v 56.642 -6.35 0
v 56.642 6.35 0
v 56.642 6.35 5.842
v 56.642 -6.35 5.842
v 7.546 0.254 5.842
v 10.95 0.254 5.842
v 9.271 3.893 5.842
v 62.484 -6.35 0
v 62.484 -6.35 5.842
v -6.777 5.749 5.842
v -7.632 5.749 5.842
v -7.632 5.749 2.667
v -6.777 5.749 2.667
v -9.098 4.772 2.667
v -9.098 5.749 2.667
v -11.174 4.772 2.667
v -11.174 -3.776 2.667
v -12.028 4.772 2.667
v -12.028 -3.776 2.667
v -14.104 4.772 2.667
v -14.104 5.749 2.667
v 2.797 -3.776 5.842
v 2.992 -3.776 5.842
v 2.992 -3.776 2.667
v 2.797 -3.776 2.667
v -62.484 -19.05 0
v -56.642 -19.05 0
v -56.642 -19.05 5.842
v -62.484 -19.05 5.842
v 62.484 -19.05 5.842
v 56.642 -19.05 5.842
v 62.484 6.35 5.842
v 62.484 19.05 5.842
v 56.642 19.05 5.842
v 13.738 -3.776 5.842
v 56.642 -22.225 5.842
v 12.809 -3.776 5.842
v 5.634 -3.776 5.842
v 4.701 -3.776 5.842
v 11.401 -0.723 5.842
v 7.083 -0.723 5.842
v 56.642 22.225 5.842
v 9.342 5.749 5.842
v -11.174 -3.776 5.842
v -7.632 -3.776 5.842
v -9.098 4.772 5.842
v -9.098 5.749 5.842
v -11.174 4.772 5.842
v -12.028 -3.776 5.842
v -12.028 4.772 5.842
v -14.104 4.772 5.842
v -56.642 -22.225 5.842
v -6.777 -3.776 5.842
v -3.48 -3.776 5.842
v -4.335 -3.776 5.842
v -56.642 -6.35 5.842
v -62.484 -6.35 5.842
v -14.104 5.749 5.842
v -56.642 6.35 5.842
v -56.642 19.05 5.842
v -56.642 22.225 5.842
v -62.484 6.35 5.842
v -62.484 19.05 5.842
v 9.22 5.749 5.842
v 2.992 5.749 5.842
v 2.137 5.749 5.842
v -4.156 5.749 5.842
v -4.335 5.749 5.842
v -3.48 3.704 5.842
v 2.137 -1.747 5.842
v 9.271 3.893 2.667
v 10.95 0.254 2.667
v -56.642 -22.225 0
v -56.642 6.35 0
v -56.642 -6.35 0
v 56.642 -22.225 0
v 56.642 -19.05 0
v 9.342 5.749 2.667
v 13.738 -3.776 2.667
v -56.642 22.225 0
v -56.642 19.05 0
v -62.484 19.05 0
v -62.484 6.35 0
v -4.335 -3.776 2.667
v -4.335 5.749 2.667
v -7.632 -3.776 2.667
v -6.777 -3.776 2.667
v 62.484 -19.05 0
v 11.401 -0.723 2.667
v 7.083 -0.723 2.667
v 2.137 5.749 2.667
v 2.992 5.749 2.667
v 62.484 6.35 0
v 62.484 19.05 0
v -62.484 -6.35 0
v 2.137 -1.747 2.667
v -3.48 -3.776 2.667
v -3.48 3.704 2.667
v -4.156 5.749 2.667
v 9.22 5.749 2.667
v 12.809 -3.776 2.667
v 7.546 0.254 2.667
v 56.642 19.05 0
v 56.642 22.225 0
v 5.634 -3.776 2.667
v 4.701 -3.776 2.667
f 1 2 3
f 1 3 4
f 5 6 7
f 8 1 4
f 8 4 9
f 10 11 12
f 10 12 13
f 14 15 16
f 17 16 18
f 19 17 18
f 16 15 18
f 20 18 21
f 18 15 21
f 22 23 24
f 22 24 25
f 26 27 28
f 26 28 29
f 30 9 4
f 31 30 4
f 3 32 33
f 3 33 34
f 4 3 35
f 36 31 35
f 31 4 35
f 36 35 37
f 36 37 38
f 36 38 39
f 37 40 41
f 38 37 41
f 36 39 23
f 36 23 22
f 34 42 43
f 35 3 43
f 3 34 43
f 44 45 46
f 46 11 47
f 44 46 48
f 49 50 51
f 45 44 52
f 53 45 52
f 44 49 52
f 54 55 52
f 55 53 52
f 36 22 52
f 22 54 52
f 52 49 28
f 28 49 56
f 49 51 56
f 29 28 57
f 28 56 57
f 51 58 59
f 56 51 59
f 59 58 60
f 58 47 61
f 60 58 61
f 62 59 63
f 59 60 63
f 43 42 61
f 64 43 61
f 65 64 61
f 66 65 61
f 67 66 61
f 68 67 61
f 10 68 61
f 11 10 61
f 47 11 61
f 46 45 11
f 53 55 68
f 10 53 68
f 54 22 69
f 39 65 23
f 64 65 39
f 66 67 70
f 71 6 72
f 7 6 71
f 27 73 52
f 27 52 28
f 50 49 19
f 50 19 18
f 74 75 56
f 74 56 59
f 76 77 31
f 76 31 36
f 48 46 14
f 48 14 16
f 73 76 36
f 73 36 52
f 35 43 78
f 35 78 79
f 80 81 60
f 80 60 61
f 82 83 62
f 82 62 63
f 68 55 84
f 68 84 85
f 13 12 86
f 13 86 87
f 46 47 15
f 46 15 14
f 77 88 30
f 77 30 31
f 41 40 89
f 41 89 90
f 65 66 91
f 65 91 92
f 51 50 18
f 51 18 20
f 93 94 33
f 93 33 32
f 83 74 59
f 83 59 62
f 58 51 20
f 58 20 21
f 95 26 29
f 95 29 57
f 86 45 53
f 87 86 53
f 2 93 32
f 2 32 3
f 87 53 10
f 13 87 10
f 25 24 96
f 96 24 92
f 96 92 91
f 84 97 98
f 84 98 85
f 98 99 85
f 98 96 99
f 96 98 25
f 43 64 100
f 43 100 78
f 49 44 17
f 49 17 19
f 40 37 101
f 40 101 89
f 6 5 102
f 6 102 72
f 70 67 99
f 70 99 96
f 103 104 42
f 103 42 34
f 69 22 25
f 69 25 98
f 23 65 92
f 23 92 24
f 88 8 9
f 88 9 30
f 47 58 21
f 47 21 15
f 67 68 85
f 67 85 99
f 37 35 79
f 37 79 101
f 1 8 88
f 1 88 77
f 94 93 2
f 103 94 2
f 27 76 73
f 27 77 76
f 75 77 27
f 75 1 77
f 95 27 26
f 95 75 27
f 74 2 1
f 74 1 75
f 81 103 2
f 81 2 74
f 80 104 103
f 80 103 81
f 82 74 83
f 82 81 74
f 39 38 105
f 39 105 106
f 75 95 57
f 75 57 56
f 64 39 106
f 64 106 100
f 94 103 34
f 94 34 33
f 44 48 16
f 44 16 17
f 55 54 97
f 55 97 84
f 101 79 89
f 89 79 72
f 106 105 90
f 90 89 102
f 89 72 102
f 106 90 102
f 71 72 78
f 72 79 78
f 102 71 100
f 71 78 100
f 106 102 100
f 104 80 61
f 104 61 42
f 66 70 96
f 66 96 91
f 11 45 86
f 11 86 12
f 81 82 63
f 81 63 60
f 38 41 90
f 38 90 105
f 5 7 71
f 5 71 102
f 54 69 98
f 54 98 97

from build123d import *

# Parameters (mm, degrees)
BOSS_EXTRUDE1_DEPTH = 5.842
SKETCH2_W           = 0.854807692
SKETCH2_H           = 9.525
CUT_EXTRUDE1_DEPTH  = 3.175


with BuildPart() as part:
    # Sketch1 → Boss-Extrude1 (new body)
    with BuildSketch(Plane.XY):
        Polygon((56.642, -22.225), (-56.642, -22.225), (-56.642, -19.05), (-62.484, -19.05), (-62.484, -6.35), (-56.642, -6.35), (-56.642, 6.35), (-62.484, 6.35), (-62.484, 19.05), (-56.642, 19.05), (-56.642, 22.225), (56.642, 22.225), (56.642, 19.05), (62.484, 19.05), (62.484, 6.35), (56.642, 6.35), (56.642, -6.35), (62.484, -6.35), (62.484, -19.05), (56.642, -19.05), align=None)
    extrude(amount=BOSS_EXTRUDE1_DEPTH)

    # Sketch2 → Cut-Extrude1 (cut)
    with BuildSketch(Plane.XY.offset(5.842)):
        Polygon((-14.104326923, 4.772358215), (-14.104326923, 5.749281292), (-9.097596154, 5.749281292), (-9.097596154, 4.772358215), (-11.173557692, 4.772358215), (-11.173557692, -3.775718708), (-12.028365385, -3.775718708), (-12.028365385, 4.772358215), align=None)
        with Locations((-7.204807692, 0.986781292)):
            Rectangle(SKETCH2_W, SKETCH2_H)
        Polygon((-4.335096154, -3.775718708), (-4.335096154, 5.749281292), (-4.155739183, 5.749281292), (2.137019231, -1.747458491), (2.137019231, 5.749281292), (2.991826923, 5.749281292), (2.991826923, -3.775718708), (2.797205529, -3.775718708), (-3.480288462, 3.7038486), (-3.480288462, -3.775718708), align=None)
        Polygon((9.341826923, 5.749281292), (13.737980769, -3.775718708), (12.808759014, -3.775718708), (11.400615986, -0.722834092), (7.082692308, -0.722834092), (5.634480168, -3.775718708), (4.701442308, -3.775718708), (9.219711538, 5.749281292), align=None)
        Polygon((9.271228966, 3.892745835), (7.546349159, 0.254088984), (10.950315505, 0.254088984), align=None, mode=Mode.SUBTRACT)
    extrude(amount=-CUT_EXTRUDE1_DEPTH, mode=Mode.SUBTRACT)


solid = part.part
